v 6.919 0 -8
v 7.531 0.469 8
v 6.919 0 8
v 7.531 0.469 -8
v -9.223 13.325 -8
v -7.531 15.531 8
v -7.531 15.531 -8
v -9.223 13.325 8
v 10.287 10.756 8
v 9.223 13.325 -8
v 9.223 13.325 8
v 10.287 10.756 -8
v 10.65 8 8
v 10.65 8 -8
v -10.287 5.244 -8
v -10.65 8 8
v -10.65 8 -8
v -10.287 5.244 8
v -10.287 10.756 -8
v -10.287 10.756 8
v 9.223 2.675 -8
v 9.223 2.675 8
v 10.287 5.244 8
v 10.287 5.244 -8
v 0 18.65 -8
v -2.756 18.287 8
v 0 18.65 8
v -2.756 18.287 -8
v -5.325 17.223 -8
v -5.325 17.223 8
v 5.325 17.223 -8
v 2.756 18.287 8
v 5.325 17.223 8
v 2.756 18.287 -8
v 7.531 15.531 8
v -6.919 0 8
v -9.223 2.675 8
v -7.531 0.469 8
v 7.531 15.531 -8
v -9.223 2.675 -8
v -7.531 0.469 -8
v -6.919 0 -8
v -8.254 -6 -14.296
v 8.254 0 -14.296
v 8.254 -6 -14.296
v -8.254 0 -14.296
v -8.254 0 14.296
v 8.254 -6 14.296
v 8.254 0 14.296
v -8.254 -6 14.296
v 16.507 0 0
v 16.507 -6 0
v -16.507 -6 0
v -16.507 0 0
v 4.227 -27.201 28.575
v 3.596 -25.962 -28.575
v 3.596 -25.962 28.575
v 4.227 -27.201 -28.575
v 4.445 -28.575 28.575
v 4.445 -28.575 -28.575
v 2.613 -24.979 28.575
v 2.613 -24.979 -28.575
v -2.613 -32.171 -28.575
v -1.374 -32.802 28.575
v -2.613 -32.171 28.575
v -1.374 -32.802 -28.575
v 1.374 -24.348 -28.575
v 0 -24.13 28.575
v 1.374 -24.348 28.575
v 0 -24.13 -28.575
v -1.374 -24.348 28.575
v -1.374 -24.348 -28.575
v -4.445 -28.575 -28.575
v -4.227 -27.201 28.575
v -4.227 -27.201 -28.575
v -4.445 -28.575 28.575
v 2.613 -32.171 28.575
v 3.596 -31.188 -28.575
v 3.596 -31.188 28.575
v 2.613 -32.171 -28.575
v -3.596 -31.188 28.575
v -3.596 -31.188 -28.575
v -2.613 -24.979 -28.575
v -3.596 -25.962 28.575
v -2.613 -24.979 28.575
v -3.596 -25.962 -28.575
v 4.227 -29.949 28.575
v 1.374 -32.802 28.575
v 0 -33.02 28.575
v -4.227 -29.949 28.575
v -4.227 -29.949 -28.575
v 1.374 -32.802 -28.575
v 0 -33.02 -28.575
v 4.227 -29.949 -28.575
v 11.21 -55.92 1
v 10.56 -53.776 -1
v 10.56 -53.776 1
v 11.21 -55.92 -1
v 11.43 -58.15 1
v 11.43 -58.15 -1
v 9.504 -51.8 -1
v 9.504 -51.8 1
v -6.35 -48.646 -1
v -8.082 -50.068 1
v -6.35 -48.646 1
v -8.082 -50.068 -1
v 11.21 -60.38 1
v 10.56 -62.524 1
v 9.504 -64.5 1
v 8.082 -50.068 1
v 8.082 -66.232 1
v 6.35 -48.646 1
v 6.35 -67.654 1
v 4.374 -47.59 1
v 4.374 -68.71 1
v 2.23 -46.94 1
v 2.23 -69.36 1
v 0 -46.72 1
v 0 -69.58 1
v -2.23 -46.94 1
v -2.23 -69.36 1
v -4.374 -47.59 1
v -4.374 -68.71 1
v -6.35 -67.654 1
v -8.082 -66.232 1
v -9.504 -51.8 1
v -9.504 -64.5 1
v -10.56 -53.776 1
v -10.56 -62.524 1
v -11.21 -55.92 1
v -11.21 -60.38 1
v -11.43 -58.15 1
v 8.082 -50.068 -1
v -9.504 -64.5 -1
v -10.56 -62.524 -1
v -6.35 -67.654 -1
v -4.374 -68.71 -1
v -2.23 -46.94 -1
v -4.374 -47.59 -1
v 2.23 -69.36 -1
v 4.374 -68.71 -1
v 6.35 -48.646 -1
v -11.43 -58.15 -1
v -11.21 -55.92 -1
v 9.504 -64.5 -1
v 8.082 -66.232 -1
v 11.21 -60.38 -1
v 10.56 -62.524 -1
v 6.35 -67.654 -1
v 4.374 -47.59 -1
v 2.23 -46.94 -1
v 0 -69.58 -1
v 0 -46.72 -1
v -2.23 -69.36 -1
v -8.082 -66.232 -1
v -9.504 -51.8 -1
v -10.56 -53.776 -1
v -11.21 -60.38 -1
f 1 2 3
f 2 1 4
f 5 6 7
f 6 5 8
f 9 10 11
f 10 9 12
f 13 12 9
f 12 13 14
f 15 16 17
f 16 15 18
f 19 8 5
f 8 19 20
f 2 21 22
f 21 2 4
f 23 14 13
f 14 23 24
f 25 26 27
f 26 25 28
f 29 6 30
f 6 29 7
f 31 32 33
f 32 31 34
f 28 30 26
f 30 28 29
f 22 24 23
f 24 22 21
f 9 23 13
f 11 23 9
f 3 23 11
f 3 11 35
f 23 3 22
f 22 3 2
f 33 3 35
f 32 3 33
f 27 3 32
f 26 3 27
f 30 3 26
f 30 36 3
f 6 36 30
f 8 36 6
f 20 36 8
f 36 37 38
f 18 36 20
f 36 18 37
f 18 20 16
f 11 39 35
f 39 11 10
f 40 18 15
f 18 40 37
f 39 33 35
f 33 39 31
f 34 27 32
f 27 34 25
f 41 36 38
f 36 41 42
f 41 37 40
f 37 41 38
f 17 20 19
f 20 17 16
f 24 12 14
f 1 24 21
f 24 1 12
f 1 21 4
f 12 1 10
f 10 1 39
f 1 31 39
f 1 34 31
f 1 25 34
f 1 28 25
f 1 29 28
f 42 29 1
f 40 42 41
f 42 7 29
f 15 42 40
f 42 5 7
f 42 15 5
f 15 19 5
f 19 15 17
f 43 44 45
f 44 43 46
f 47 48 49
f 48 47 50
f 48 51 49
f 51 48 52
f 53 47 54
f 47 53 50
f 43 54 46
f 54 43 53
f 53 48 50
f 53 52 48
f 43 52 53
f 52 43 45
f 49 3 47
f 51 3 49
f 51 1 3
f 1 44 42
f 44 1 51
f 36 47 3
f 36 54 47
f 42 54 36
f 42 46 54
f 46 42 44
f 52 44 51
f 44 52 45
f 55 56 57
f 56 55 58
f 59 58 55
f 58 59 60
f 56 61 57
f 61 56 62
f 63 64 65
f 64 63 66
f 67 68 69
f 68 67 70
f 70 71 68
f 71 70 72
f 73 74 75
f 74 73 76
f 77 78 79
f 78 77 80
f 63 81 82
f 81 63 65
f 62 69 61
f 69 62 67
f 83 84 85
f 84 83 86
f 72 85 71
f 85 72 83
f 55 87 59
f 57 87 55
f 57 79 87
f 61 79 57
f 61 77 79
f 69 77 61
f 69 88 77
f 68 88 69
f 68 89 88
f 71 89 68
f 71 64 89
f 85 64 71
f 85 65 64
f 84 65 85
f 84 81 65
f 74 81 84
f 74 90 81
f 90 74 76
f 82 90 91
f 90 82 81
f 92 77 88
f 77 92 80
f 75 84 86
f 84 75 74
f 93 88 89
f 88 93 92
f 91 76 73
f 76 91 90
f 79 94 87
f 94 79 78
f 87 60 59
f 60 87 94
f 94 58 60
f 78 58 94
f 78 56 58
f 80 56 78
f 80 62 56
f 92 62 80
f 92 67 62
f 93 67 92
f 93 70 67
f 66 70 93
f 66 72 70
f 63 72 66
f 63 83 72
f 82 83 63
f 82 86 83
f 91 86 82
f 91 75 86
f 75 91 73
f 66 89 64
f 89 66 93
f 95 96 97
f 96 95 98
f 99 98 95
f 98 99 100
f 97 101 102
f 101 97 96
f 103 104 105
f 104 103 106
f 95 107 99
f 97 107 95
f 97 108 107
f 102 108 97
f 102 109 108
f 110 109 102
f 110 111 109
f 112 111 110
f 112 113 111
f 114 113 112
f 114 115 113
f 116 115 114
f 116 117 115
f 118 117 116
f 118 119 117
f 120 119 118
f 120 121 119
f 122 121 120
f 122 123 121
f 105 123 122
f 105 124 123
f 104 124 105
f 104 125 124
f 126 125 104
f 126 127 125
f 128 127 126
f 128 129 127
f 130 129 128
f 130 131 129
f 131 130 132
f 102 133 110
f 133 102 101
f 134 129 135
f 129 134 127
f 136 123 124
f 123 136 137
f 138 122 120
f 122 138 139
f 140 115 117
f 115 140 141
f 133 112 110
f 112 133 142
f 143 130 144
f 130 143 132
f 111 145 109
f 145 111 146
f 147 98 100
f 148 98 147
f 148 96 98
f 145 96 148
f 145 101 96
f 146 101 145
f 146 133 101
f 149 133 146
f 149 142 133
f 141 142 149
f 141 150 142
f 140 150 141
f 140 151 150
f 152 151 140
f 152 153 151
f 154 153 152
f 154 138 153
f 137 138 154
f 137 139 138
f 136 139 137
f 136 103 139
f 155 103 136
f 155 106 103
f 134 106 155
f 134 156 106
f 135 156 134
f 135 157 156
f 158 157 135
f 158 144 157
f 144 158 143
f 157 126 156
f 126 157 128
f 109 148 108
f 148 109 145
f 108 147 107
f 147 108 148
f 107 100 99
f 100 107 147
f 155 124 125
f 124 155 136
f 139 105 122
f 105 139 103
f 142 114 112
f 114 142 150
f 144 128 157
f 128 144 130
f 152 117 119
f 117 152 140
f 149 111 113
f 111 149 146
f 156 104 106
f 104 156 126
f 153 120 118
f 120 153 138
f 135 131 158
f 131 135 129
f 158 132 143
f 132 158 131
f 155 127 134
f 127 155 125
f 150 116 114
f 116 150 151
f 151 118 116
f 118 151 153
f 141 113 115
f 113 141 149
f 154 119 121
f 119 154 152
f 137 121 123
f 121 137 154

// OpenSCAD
// Auto-generated by scripts/author_from_manifest.py (Phase D.3).
// Source: data/phase_d_manifest.json (sku_intent='tyco-ty3251-pendent-135f').
// Do not hand-edit — regenerate from the manifest.
//
// @part tyco_ty3251_pendent_135f
// @kind sprinkler_head
// @category head.pendant.k56
// @display-name "Tyco TY3251 Pendent K5.6 SR 135°F"
// @mfg tyco_fire_protection
// @mfg-pn TY3251
// @listing UL FM
// @hazard-classes LH OH1
// @price-usd 14.20
// @install-minutes 8
// @crew journeyman
// @k-factor 5.6
// @orientation pendant
// @response standard
// @temperature 135F
// @param size_in number default=0.5 label="Size" unit="in"
// @port inlet position=[0,0.014,0] direction=[0,1,0] style=NPT_threaded size_in=0.5 role=drop

size_in = 0.5;
k_factor = 5.6;

length_mm   = 57.15;
body_dia_mm = 25.40;
thread_od   = 21.3;
thread_len  = 16;
deflector_d = body_dia_mm * 0.9;

 union() {
    translate([0, thread_len/2, 0])
        cylinder(h = thread_len, d = thread_od, center = true, $fn = 24);
    translate([0, -3, 0])
        rotate([90, 0, 0])
        cylinder(h = 6, d = thread_od * 1.55, $fn = 6, center = true);
    translate([0, -length_mm/2, 0])
        cylinder(h = length_mm, d = body_dia_mm * 0.35, center = true, $fn = 20);
    translate([0, -length_mm - 1, 0])
        cylinder(h = 2, d = deflector_d, center = true, $fn = 32);
}
